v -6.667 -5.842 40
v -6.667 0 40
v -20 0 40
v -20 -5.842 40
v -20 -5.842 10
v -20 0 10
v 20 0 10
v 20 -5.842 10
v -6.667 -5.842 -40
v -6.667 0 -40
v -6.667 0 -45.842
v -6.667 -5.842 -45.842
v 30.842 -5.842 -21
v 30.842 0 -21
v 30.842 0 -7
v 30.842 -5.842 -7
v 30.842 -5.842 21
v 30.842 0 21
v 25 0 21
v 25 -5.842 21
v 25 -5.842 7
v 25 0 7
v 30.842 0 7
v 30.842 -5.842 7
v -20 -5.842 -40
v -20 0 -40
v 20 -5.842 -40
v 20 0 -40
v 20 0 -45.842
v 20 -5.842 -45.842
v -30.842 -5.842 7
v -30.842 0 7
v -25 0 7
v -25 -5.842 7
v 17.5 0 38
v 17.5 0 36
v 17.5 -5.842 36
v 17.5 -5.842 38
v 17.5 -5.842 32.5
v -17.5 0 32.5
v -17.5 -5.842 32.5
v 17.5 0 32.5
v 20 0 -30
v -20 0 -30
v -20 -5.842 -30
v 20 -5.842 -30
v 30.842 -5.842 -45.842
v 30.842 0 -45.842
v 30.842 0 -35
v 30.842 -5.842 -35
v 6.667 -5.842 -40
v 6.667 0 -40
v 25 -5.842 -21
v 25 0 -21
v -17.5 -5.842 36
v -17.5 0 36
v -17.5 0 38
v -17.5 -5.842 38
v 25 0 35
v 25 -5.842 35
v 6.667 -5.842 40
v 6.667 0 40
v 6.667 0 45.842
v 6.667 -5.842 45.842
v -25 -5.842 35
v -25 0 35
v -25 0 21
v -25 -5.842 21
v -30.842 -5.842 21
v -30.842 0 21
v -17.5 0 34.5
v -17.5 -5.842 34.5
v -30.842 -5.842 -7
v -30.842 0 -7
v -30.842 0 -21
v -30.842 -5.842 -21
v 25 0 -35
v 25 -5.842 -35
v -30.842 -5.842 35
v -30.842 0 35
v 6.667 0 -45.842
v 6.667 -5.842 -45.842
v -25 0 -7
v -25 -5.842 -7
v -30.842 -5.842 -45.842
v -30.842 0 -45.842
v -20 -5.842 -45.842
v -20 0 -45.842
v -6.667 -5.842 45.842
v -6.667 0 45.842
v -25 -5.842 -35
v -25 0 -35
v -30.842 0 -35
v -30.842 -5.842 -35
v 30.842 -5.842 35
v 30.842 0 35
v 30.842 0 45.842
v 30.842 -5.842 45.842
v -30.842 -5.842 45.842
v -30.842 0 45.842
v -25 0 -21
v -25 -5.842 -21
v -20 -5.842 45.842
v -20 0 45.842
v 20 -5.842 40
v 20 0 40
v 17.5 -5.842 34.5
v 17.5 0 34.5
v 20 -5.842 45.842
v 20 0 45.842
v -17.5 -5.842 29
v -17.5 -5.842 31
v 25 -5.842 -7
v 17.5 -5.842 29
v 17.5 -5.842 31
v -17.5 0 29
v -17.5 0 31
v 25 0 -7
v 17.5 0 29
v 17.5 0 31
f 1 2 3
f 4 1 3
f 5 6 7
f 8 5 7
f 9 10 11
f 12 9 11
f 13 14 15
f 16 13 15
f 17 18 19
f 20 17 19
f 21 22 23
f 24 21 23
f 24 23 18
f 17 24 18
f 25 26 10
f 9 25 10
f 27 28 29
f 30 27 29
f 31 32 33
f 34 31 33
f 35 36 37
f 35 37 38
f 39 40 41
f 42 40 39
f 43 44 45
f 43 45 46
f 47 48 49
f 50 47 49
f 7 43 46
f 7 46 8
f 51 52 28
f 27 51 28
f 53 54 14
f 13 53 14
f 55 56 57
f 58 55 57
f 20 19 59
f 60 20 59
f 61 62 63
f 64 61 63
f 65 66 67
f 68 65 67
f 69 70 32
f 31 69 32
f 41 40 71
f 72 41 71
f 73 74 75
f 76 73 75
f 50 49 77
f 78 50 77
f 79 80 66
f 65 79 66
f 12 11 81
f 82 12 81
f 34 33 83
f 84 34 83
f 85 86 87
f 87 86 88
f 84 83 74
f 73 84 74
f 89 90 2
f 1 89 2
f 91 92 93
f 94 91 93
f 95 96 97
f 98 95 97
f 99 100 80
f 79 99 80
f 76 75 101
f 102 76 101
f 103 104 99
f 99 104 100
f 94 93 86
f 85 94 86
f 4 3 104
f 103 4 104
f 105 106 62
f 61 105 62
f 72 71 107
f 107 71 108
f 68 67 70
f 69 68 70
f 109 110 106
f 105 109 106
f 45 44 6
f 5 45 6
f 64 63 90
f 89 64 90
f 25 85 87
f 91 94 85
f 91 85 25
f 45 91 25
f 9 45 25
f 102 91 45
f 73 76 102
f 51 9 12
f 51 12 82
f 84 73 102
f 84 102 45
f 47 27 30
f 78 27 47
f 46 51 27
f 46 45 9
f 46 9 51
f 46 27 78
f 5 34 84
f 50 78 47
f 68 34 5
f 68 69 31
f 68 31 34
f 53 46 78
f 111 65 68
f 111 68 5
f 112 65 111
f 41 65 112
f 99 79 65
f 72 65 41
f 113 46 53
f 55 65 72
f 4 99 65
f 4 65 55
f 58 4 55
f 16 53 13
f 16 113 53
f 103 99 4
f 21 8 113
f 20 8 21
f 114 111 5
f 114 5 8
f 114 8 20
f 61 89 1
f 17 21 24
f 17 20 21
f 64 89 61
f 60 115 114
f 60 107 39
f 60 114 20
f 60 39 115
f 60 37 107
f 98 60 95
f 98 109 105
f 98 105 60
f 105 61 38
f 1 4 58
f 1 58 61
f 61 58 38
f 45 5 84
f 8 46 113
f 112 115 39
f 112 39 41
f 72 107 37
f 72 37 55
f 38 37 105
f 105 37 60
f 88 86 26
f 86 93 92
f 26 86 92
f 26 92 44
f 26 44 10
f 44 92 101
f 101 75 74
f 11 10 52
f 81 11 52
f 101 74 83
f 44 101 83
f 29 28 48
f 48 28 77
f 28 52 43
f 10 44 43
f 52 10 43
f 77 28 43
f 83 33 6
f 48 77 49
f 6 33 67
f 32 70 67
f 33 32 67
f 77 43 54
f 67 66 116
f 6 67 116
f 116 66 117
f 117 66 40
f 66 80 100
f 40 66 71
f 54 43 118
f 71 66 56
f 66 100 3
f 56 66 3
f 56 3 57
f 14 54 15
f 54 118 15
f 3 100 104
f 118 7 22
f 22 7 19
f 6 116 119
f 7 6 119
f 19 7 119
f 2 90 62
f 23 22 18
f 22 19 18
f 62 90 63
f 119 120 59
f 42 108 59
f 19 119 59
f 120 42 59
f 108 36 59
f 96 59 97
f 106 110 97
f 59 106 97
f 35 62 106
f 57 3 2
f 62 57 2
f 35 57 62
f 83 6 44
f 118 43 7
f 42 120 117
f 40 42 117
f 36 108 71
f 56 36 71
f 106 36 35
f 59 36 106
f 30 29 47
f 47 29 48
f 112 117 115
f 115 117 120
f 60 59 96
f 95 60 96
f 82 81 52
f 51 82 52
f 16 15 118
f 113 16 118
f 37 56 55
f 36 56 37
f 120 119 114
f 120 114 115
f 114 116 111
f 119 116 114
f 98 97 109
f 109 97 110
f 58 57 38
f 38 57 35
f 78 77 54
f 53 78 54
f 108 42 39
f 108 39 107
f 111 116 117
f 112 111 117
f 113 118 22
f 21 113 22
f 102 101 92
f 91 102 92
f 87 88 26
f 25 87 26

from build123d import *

# Parameters (mm, degrees)
F0_W     = 40
F0_H     = 40
F0_W_2   = 35
F0_H_2   = 2
F1_DEPTH = 5.842


with BuildPart() as f1:
    # F0 (on Front) → F1 (new body)
    with BuildSketch(Plane.XZ):
        Polygon((-20, -45.842), (-20, -40), (-6.666667, -40), (-6.666667, -45.842), (6.666667, -45.842), (6.666667, -40), (20, -40), (20, -45.842), (30.842, -45.842), (30.842, -35), (25, -35), (25, -21), (30.842, -21), (30.842, -7), (25, -7), (25, 7), (30.842, 7), (30.842, 21), (25, 21), (25, 35), (30.842, 35), (30.842, 45.842), (20, 45.842), (20, 40), (6.666667, 40), (6.666667, 45.842), (-6.666667, 45.842), (-6.666667, 40), (-20, 40), (-20, 45.842), (-30.842, 45.842), (-30.842, 35), (-25, 35), (-25, 21), (-30.842, 21), (-30.842, 7), (-25, 7), (-25, -7), (-30.842, -7), (-30.842, -21), (-25, -21), (-25, -35), (-30.842, -35), (-30.842, -45.842), align=None)
        with Locations((0, -10)):
            Rectangle(F0_W, F0_H, mode=Mode.SUBTRACT)
        with Locations((0, 30)):
            Rectangle(F0_W_2, F0_H_2, mode=Mode.SUBTRACT)
        with Locations((0, 33.5)):
            Rectangle(F0_W_2, F0_H_2, mode=Mode.SUBTRACT)
        with Locations((0, 37)):
            Rectangle(F0_W_2, F0_H_2, mode=Mode.SUBTRACT)
    extrude(amount=F1_DEPTH)


solid = f1.part
